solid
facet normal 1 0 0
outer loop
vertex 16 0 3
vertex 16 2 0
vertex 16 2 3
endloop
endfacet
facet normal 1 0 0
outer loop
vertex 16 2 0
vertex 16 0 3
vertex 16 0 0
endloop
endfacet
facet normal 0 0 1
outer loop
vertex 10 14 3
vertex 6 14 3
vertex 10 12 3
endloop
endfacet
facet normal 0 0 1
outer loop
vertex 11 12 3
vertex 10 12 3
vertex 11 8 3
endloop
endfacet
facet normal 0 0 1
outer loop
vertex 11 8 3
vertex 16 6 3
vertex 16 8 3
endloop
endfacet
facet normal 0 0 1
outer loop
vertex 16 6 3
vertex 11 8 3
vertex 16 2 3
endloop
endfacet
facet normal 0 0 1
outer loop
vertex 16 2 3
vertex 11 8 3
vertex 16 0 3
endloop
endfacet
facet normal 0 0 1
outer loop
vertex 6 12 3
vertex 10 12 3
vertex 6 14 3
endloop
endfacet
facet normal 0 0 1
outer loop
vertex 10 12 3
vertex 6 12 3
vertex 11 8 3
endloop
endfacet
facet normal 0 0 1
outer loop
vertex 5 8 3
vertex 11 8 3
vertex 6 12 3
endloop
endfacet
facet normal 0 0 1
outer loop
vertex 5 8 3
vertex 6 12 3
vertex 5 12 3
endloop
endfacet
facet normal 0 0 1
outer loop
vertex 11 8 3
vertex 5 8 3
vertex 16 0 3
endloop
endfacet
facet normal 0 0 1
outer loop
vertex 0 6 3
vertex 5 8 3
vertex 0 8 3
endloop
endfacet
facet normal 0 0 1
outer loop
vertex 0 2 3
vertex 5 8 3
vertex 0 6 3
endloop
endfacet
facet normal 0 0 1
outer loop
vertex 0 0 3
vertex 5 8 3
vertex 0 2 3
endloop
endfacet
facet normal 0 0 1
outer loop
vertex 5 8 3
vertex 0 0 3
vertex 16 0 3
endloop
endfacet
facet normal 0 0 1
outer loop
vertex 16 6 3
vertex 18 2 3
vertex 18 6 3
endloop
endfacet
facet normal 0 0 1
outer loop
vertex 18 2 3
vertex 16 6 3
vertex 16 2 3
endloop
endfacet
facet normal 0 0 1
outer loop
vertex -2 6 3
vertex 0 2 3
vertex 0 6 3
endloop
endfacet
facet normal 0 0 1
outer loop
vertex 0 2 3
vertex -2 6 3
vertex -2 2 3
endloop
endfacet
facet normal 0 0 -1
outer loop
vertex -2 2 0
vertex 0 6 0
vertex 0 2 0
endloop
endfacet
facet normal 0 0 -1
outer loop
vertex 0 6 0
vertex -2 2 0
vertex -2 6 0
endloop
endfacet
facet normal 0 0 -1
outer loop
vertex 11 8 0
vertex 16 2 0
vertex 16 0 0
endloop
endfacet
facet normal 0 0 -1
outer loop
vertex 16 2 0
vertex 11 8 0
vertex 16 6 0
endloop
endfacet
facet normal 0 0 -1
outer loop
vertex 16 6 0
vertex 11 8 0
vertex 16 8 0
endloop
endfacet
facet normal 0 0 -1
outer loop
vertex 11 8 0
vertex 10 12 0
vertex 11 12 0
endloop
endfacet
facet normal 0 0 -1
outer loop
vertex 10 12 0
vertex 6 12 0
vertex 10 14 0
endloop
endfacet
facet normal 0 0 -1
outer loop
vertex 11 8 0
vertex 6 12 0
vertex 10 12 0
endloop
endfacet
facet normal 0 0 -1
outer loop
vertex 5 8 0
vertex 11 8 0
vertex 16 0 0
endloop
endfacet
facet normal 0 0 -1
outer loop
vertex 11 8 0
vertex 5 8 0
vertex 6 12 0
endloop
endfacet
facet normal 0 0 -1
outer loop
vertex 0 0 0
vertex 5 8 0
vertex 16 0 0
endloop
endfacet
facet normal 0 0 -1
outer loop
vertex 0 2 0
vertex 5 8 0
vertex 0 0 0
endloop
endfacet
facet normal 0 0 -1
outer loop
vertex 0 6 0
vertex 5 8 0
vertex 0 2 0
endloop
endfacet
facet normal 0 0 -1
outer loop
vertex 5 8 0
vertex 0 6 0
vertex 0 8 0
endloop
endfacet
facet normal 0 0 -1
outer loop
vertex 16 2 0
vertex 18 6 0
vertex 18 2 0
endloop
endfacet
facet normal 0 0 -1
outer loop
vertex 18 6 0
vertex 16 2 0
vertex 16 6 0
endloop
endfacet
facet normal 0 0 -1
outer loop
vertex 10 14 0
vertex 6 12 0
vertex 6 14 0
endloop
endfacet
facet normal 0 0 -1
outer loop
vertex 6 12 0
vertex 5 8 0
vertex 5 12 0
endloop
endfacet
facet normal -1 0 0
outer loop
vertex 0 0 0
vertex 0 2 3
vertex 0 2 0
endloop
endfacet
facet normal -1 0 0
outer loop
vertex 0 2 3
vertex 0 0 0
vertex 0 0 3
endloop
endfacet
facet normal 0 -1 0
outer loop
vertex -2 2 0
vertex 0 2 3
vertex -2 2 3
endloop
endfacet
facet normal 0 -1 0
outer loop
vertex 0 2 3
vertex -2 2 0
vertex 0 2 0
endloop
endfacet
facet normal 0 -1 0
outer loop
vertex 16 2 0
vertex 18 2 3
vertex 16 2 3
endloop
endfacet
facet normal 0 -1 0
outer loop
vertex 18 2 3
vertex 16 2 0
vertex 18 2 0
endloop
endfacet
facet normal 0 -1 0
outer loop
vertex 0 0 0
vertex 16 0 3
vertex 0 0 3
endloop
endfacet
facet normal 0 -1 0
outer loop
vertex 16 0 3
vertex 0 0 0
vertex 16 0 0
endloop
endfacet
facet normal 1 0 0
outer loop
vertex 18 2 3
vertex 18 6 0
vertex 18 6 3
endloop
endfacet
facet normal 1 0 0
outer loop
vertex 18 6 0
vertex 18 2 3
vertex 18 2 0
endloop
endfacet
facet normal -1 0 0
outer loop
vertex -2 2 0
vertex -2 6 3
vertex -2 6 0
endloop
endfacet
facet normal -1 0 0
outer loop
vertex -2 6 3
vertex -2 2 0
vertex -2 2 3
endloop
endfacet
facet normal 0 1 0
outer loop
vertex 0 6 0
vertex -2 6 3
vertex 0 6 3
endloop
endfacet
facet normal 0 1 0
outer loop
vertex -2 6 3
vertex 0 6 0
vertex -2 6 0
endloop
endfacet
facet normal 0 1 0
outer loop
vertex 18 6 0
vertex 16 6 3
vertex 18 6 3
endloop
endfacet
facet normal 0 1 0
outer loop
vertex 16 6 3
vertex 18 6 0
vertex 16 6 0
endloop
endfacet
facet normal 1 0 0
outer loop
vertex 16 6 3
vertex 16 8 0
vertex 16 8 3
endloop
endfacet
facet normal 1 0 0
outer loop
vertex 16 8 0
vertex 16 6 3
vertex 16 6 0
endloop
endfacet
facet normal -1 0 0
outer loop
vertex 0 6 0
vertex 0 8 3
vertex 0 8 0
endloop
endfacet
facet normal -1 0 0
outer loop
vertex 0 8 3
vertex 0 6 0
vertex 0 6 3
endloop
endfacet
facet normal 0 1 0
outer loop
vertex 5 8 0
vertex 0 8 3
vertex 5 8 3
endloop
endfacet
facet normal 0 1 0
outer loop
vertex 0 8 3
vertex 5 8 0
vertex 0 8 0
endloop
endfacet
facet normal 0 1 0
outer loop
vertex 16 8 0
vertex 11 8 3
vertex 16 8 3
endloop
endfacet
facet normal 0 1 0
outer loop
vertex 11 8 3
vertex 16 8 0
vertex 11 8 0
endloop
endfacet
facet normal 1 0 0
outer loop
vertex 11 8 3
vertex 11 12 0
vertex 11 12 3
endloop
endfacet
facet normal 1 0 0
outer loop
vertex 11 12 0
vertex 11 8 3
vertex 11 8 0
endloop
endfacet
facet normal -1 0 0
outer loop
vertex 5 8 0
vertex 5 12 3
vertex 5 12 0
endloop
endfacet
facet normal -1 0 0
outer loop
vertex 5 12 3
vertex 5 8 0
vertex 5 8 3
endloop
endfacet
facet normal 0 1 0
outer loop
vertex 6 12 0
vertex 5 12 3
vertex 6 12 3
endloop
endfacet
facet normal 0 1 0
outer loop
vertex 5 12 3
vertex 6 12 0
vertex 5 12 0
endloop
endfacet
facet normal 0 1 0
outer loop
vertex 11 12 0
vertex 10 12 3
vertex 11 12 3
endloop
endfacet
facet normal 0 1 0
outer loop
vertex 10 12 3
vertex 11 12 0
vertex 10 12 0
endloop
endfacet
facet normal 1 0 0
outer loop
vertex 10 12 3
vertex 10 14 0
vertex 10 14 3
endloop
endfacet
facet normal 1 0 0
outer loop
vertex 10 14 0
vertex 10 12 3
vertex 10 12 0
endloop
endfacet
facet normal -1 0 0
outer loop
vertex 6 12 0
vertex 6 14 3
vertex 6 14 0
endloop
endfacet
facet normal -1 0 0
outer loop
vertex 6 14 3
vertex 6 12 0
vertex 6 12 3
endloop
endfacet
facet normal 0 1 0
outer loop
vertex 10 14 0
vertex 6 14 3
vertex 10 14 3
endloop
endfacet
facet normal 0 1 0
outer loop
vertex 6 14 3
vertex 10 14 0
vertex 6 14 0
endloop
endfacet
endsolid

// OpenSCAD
//Question 4
color("#088F8F"){
    cube([16, 2, 3]);
    translate([-2, 2, 0])
        cube([20, 4, 3]);
    translate([0, 6, 0])
        cube([16, 2, 3]);
    translate([5, 8, 0])
        cube([6, 4, 3]);
    translate([6, 12, 0])
        cube([4, 2, 3]);
    }
